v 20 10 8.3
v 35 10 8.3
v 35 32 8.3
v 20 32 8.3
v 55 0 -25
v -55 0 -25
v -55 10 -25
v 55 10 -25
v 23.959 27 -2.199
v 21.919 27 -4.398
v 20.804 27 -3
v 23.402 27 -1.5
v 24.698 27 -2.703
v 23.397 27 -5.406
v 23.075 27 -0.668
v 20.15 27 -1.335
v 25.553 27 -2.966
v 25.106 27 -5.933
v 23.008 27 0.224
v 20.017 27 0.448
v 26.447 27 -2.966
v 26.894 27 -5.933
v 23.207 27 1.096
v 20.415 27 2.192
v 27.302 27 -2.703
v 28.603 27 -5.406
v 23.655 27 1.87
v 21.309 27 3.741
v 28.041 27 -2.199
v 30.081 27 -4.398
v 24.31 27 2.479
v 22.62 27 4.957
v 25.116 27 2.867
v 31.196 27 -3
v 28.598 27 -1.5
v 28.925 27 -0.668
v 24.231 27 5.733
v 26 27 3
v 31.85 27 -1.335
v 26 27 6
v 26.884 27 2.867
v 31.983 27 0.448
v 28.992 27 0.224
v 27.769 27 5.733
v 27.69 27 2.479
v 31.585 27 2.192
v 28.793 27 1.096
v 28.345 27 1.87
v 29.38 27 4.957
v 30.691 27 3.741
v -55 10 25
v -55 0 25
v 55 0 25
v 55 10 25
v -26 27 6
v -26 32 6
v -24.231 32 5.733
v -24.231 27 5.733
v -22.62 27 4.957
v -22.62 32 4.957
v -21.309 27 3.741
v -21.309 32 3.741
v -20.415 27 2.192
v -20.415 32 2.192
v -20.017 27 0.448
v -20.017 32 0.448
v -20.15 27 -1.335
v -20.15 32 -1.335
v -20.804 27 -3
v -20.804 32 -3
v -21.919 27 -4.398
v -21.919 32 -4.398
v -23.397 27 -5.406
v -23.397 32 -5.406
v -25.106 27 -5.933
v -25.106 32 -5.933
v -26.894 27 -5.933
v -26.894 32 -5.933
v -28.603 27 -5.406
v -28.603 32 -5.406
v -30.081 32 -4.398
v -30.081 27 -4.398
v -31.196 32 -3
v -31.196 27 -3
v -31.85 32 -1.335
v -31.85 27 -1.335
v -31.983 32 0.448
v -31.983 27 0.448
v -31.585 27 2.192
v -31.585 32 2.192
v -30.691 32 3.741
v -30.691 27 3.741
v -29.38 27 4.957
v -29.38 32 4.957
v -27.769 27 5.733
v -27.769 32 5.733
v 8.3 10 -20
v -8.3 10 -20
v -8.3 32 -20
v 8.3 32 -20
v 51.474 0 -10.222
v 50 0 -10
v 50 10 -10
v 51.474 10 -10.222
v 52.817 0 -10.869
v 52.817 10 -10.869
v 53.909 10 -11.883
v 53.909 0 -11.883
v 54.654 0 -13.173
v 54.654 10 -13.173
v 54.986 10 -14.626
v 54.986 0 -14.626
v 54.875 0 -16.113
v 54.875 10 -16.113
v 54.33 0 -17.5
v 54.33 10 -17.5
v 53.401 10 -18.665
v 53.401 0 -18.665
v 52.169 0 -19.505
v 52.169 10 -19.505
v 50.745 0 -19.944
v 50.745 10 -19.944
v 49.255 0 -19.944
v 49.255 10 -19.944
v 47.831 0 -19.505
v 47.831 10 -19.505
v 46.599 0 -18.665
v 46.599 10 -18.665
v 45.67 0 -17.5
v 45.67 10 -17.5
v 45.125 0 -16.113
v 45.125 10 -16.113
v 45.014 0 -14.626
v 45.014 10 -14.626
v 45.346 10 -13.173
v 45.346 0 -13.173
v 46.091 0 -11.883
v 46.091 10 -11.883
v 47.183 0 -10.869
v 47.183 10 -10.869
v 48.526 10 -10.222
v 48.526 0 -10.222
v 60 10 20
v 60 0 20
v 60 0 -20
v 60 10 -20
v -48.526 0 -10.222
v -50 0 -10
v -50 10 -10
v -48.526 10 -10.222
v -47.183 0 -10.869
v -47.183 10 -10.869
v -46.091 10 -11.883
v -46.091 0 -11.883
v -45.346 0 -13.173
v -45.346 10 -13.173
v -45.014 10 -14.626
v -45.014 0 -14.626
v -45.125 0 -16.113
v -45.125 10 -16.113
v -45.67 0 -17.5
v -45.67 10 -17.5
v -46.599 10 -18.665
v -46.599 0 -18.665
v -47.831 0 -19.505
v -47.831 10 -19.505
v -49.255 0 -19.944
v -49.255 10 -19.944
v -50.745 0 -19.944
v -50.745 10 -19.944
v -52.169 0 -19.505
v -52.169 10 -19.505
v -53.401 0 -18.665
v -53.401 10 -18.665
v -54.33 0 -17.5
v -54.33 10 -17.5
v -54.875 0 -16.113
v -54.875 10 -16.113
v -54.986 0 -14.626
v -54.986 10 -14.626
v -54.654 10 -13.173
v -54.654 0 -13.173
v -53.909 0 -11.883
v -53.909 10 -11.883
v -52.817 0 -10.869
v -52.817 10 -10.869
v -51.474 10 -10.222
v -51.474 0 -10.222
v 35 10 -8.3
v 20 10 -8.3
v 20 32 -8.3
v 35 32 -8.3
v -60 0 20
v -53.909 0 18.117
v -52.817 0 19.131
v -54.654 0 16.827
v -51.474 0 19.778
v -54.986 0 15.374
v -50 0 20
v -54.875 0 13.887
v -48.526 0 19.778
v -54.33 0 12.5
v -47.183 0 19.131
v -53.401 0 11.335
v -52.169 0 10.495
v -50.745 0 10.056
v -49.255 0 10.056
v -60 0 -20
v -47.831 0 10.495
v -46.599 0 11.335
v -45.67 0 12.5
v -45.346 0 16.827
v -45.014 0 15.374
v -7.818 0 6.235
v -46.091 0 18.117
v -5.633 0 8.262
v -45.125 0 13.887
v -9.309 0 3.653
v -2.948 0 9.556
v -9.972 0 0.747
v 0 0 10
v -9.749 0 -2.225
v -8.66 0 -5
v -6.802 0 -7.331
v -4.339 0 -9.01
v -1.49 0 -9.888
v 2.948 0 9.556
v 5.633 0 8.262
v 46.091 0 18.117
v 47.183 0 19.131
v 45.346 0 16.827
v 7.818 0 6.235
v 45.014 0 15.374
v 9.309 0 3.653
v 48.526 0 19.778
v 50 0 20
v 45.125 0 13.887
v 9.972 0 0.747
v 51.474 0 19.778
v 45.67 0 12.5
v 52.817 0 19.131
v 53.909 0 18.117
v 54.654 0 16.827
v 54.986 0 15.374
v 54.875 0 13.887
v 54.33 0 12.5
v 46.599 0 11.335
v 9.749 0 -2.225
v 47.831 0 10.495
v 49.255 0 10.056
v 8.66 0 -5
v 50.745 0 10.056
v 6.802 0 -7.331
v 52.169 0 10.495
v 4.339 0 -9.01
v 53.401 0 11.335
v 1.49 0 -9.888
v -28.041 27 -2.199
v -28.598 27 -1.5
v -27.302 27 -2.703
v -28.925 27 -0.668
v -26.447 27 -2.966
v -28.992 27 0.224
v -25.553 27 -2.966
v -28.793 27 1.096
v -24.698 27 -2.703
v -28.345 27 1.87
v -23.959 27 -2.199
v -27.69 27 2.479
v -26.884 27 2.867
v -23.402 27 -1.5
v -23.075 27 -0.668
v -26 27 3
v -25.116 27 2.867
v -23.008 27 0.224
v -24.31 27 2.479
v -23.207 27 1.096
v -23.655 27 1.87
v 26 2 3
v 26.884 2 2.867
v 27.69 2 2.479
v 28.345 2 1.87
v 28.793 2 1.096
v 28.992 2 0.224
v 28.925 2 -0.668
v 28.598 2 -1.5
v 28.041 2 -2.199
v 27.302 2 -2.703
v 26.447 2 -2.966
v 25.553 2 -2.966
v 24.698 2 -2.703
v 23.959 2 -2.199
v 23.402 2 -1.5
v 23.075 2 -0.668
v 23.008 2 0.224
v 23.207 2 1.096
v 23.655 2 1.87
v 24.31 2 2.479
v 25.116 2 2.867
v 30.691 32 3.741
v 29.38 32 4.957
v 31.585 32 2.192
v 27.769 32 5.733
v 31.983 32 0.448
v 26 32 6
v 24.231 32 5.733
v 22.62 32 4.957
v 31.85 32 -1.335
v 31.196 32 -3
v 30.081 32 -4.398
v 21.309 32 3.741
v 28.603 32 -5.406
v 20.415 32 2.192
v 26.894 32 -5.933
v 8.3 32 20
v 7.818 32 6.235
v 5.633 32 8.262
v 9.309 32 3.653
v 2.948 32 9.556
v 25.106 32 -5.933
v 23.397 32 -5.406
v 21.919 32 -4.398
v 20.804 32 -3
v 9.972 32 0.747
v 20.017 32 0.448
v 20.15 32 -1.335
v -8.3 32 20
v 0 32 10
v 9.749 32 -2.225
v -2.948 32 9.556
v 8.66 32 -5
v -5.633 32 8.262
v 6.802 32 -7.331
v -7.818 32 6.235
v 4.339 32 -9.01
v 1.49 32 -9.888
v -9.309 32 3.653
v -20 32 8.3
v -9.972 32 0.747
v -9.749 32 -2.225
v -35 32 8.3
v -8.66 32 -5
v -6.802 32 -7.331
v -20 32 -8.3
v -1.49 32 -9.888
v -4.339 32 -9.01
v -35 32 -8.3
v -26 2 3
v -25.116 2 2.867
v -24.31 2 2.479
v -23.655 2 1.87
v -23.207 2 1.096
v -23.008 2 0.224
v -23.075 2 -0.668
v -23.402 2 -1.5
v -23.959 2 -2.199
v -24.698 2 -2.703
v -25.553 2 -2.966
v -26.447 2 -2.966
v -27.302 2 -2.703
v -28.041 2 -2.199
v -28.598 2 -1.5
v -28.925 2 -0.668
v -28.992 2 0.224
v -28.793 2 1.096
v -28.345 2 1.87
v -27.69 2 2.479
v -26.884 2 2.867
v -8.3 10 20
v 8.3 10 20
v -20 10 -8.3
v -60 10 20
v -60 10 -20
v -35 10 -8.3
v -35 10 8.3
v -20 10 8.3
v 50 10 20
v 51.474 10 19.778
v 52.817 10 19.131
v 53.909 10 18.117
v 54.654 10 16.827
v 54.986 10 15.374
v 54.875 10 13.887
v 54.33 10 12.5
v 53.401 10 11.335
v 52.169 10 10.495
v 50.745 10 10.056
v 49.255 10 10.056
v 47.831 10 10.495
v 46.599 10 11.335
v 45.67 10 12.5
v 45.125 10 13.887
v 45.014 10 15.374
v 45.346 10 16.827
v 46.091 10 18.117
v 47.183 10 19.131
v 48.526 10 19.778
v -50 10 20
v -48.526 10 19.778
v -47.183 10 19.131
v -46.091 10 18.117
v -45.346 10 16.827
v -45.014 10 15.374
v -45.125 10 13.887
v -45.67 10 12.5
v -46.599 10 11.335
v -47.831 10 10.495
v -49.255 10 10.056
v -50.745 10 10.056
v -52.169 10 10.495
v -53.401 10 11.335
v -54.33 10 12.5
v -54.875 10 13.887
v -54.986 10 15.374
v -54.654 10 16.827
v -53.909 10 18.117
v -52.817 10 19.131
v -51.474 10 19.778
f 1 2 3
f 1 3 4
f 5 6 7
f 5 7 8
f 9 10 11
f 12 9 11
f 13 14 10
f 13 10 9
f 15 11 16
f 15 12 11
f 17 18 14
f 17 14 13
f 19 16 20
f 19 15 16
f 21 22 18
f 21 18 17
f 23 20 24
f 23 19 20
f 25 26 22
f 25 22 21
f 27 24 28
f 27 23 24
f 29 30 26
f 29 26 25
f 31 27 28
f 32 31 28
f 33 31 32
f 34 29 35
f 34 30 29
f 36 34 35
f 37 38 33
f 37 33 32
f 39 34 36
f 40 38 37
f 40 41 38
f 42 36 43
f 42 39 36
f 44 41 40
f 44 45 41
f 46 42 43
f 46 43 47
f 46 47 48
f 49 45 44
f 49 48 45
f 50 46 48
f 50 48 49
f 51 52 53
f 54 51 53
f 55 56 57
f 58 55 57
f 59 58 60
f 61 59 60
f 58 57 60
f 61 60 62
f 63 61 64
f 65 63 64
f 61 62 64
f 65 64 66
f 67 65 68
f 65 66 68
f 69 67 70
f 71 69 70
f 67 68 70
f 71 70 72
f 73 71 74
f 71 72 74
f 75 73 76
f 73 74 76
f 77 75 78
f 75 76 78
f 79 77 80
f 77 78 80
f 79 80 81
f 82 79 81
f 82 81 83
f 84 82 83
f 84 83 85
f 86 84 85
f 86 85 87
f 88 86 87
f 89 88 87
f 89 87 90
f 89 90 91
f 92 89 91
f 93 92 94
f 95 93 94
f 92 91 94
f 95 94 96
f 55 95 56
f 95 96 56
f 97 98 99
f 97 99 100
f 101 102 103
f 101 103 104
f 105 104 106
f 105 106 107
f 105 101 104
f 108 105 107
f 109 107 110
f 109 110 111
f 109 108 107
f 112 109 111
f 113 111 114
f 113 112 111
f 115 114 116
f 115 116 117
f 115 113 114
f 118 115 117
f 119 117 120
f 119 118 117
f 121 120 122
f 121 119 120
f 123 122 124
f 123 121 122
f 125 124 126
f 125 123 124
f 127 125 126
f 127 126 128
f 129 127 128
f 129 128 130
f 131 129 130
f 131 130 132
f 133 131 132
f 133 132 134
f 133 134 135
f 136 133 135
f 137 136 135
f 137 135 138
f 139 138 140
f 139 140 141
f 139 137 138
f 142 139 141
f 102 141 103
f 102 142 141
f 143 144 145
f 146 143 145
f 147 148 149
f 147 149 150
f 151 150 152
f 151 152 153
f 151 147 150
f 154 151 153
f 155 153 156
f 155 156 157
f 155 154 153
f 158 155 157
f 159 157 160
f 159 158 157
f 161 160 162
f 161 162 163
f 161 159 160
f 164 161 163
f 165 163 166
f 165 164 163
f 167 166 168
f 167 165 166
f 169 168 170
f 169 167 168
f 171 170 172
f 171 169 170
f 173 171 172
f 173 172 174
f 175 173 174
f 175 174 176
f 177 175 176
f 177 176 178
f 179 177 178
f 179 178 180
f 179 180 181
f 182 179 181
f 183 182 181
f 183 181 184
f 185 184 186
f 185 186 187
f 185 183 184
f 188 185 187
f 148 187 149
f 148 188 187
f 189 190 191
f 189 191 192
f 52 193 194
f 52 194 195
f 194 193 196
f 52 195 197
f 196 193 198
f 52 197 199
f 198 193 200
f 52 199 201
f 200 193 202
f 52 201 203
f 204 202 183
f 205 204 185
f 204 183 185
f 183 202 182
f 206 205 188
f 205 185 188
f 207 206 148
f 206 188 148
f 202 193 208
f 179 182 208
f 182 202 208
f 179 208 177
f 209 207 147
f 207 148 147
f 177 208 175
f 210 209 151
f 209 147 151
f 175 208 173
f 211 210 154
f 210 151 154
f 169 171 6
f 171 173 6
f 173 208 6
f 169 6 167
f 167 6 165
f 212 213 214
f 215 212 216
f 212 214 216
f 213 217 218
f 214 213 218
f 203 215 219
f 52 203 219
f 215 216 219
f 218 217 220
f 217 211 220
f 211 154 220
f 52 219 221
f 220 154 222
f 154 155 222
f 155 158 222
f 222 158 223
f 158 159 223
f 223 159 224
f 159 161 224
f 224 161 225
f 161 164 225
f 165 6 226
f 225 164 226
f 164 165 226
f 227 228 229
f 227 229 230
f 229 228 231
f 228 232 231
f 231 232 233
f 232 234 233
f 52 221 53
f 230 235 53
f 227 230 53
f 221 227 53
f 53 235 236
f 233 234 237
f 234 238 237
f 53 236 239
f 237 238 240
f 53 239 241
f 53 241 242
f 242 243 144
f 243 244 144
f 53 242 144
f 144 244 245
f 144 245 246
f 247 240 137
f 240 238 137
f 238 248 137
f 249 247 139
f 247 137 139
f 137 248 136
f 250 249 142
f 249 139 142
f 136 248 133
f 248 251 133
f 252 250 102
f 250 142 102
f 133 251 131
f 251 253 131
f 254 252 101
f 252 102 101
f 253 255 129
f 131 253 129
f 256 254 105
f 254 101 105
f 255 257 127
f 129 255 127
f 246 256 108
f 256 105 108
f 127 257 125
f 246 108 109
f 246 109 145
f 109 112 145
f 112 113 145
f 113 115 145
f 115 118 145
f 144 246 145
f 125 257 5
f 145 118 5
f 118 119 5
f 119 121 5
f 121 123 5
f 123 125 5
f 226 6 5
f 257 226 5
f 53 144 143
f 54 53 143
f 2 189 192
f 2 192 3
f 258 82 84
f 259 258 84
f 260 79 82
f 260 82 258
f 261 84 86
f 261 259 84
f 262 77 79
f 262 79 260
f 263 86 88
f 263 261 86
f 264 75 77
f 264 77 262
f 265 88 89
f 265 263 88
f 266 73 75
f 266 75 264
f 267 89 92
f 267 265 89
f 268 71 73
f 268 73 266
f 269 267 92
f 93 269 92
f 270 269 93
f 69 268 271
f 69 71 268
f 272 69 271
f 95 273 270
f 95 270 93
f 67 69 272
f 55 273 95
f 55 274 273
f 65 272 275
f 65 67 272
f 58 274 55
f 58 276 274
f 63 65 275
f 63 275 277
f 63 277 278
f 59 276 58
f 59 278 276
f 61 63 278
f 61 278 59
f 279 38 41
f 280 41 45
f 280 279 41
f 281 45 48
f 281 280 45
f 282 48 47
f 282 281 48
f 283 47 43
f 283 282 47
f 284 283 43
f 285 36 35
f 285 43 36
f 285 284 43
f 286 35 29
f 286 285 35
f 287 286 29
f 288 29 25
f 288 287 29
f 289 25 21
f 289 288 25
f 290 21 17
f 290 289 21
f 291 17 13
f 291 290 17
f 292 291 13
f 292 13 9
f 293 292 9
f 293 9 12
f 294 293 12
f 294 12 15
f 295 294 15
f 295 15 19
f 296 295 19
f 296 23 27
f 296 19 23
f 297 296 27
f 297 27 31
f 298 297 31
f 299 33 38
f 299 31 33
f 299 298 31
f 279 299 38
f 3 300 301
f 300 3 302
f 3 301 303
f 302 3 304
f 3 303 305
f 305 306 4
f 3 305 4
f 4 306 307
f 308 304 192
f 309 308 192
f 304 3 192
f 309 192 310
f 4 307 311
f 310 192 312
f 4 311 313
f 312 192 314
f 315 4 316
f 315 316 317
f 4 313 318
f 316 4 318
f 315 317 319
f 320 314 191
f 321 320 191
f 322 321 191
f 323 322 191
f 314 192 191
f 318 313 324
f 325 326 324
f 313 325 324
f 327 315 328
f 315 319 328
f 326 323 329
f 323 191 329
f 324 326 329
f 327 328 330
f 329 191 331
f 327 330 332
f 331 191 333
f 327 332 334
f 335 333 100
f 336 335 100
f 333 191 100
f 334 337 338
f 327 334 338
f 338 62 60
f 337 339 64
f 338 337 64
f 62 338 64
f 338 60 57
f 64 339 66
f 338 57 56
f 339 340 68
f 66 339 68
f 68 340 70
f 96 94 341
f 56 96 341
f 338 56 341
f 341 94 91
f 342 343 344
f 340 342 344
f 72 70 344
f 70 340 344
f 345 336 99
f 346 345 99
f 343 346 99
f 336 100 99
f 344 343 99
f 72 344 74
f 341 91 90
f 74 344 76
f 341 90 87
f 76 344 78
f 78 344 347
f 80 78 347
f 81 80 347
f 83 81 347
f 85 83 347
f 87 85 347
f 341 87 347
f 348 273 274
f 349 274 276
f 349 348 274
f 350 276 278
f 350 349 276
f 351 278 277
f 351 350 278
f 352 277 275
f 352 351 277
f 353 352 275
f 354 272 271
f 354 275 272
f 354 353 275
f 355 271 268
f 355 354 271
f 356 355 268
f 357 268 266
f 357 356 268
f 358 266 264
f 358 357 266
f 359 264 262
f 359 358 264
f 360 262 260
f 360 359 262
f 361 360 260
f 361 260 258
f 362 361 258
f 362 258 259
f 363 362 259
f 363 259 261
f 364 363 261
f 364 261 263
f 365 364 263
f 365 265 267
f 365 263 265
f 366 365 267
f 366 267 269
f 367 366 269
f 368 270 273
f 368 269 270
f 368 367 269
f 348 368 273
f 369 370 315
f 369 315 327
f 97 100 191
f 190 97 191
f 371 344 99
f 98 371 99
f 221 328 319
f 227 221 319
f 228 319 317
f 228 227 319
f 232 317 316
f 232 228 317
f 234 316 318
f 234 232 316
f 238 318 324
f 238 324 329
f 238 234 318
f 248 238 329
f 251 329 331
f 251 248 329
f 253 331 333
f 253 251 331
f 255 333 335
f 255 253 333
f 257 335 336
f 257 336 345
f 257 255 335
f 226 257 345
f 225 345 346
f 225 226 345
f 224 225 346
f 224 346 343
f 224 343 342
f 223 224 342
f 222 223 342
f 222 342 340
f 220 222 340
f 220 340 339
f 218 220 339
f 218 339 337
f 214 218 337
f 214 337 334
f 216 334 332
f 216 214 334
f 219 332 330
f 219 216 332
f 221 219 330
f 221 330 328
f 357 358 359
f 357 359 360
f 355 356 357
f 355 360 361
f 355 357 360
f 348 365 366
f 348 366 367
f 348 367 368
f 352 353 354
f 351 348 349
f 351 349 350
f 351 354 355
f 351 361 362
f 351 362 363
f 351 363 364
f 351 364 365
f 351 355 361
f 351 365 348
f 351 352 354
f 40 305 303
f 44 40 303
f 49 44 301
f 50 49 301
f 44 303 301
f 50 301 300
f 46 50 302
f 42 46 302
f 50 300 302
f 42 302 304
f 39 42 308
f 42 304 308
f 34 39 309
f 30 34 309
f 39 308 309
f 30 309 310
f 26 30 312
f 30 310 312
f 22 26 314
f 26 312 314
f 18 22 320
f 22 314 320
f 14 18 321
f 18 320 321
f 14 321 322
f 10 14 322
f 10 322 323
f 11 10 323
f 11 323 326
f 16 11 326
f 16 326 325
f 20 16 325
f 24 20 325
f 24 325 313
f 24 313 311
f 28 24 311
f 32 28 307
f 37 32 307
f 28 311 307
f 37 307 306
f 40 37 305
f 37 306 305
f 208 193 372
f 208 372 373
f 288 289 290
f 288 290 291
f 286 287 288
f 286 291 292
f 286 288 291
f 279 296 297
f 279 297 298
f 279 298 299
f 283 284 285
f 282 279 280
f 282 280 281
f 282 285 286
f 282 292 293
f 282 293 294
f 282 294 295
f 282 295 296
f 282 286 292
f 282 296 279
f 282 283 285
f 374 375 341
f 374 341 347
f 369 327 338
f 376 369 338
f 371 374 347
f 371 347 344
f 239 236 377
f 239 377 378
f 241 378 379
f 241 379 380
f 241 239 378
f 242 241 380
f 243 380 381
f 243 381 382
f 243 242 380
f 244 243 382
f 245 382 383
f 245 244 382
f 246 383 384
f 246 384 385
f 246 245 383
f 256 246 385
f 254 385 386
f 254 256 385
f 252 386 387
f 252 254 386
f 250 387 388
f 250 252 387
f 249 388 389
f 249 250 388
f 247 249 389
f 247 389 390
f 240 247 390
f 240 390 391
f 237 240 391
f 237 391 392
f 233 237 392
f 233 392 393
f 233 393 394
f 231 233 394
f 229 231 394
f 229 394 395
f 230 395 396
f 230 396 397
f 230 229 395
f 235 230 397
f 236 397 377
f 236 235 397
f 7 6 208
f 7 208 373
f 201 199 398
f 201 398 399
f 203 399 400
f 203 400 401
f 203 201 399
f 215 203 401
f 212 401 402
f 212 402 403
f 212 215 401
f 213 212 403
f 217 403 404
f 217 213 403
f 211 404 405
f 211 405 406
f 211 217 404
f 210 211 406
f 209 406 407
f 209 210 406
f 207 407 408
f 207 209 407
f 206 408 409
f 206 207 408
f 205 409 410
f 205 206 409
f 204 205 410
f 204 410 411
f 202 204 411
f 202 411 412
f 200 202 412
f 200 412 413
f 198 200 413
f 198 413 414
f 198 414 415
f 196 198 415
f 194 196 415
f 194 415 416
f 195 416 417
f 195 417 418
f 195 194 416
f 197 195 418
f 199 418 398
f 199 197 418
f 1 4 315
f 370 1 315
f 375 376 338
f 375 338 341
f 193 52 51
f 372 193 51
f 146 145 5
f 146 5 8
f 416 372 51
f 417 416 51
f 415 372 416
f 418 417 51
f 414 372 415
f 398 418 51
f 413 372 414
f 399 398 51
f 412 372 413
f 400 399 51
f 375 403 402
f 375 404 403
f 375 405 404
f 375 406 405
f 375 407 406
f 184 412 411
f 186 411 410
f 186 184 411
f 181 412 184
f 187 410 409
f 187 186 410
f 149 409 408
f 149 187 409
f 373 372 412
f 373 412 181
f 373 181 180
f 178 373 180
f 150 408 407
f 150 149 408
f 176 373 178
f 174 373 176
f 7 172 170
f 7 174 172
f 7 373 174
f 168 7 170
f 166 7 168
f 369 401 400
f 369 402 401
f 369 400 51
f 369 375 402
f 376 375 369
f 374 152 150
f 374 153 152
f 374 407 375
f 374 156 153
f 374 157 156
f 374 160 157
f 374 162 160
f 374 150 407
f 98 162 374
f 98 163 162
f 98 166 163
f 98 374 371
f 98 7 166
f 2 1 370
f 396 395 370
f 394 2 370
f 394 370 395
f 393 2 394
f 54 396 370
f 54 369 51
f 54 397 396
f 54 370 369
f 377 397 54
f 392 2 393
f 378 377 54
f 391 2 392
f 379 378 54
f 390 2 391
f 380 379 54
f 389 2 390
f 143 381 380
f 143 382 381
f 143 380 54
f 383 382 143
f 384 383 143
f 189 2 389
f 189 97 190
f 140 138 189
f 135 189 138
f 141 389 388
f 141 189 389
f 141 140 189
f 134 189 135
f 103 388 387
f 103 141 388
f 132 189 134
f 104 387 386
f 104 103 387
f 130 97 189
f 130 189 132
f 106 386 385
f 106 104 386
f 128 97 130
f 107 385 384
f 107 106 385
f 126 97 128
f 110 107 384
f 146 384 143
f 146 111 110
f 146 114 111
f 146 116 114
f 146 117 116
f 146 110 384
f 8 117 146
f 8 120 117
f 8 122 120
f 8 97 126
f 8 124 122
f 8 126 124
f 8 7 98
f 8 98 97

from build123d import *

# Parameters (mm, degrees)
SKETCH1_W           = 120
SKETCH1_H           = 50
SKETCH1_R           = 5
BOSS_EXTRUDE4_DEPTH = 10
SKETCH1_6_R         = 6
SKETCH1_6_R_2       = 10
SKETCH1_6_R_3       = 3
BOSS_EXTRUDE5_DEPTH = 32
CUT_EXTRUDE1_START  = 2
SKETCH1_9_R         = 3
CUT_EXTRUDE1_DEPTH  = 32
CUT_EXTRUDE2_START  = 32
SKETCH1_10_R        = 6
CUT_EXTRUDE2_DEPTH  = 5
CHAMFER1_SIZE       = 5


with BuildPart() as part:
    # Sketch1 → Boss-Extrude4 (new body)
    with BuildSketch(Plane(origin=(0, 0, 0), x_dir=(1, 0, 0), z_dir=(0, 1, 0))):
        Rectangle(SKETCH1_W, SKETCH1_H)
        with Locations(Location((50, -15, 0), (0, 0, 270))):
            Circle(SKETCH1_R, mode=Mode.SUBTRACT)
        with Locations(Location((50, 15, 0), (0, 0, 270))):
            Circle(SKETCH1_R, mode=Mode.SUBTRACT)
        with Locations(Location((-50, -15, 0), (0, 0, 270))):
            Circle(SKETCH1_R, mode=Mode.SUBTRACT)
        with Locations(Location((-50, 15, 0), (0, 0, 270))):
            Circle(SKETCH1_R, mode=Mode.SUBTRACT)
        Polygon((-8.3, -20), (-20, -8.3), (-35, -8.3), (-35, 8.3), (-20, 8.3), (-8.3, 20), (8.3, 20), (20, 8.3), (35, 8.3), (35, -8.3), (20, -8.3), (8.3, -20), align=None, mode=Mode.SUBTRACT)
    extrude(amount=BOSS_EXTRUDE4_DEPTH)

    # Sketch1<6> → Boss-Extrude5 (add)
    # profile 1 of 5: a face of its own
    with BuildSketch(Plane(origin=(0, 0, 0), x_dir=(1, 0, 0), z_dir=(0, 1, 0))):
        Polygon((-20, -8.3), (-35, -8.3), (-35, 8.3), (-20, 8.3), (-8.3, 20), (8.3, 20), (20, 8.3), (35, 8.3), (35, -8.3), (20, -8.3), (8.3, -20), (-8.3, -20), align=None)
        with Locations((26, 0)):
            Circle(SKETCH1_6_R, mode=Mode.SUBTRACT)
        with Locations((-26, 0)):
            Circle(SKETCH1_6_R, mode=Mode.SUBTRACT)
        with Locations(Location((0, 0, 0), (0, 0, 270))):
            Circle(SKETCH1_6_R_2, mode=Mode.SUBTRACT)
    # profile 2 of 5: a face of its own
    with BuildSketch(Plane(origin=(0, 0, 0), x_dir=(1, 0, 0), z_dir=(0, 1, 0))):
        with Locations((-26, 0)):
            Circle(SKETCH1_6_R)
        with Locations((-26, 0)):
            Circle(SKETCH1_6_R_3, mode=Mode.SUBTRACT)
    # profile 3 of 5: a face of its own
    with BuildSketch(Plane(origin=(0, 0, 0), x_dir=(1, 0, 0), z_dir=(0, 1, 0))):
        with Locations((-26, 0)):
            Circle(SKETCH1_6_R_3)
    # profile 4 of 5: a face of its own
    with BuildSketch(Plane(origin=(0, 0, 0), x_dir=(1, 0, 0), z_dir=(0, 1, 0))):
        with Locations((26, 0)):
            Circle(SKETCH1_6_R)
        with Locations((26, 0)):
            Circle(SKETCH1_6_R_3, mode=Mode.SUBTRACT)
    # profile 5 of 5: a face of its own
    with BuildSketch(Plane(origin=(0, 0, 0), x_dir=(1, 0, 0), z_dir=(0, 1, 0))):
        with Locations((26, 0)):
            Circle(SKETCH1_6_R_3)
    extrude(amount=BOSS_EXTRUDE5_DEPTH)

    # Sketch1<9> → Cut-Extrude1 (cut)
    with BuildSketch(Plane(origin=(0, 0, 0), x_dir=(1, 0, 0), z_dir=(0, 1, 0)).offset(CUT_EXTRUDE1_START)):
        with Locations(Location((-26, 0, 0), (0, 0, 270))):
            Circle(SKETCH1_9_R)
        with Locations(Location((26, 0, 0), (0, 0, 270))):
            Circle(SKETCH1_9_R)
    extrude(amount=CUT_EXTRUDE1_DEPTH, mode=Mode.SUBTRACT)

    # Sketch1<10> → Cut-Extrude2 (cut)
    with BuildSketch(Plane(origin=(0, 0, 0), x_dir=(1, 0, 0), z_dir=(0, 1, 0)).offset(CUT_EXTRUDE2_START)):
        with Locations(Location((-26, 0, 0), (0, 0, 270))):
            Circle(SKETCH1_10_R)
        with Locations(Location((26, 0, 0), (0, 0, 270))):
            Circle(SKETCH1_10_R)
    extrude(amount=-CUT_EXTRUDE2_DEPTH, mode=Mode.SUBTRACT)

    # Chamfer1
    chamfer1_edges = [part.edges().sort_by_distance(p)[0] for p in [
        (60, 5, 25),
        (-60, 5, 25),
        (-60, 5, -25),
        (60, 5, -25),
    ]]
    chamfer(chamfer1_edges, length=CHAMFER1_SIZE)


solid = part.part
